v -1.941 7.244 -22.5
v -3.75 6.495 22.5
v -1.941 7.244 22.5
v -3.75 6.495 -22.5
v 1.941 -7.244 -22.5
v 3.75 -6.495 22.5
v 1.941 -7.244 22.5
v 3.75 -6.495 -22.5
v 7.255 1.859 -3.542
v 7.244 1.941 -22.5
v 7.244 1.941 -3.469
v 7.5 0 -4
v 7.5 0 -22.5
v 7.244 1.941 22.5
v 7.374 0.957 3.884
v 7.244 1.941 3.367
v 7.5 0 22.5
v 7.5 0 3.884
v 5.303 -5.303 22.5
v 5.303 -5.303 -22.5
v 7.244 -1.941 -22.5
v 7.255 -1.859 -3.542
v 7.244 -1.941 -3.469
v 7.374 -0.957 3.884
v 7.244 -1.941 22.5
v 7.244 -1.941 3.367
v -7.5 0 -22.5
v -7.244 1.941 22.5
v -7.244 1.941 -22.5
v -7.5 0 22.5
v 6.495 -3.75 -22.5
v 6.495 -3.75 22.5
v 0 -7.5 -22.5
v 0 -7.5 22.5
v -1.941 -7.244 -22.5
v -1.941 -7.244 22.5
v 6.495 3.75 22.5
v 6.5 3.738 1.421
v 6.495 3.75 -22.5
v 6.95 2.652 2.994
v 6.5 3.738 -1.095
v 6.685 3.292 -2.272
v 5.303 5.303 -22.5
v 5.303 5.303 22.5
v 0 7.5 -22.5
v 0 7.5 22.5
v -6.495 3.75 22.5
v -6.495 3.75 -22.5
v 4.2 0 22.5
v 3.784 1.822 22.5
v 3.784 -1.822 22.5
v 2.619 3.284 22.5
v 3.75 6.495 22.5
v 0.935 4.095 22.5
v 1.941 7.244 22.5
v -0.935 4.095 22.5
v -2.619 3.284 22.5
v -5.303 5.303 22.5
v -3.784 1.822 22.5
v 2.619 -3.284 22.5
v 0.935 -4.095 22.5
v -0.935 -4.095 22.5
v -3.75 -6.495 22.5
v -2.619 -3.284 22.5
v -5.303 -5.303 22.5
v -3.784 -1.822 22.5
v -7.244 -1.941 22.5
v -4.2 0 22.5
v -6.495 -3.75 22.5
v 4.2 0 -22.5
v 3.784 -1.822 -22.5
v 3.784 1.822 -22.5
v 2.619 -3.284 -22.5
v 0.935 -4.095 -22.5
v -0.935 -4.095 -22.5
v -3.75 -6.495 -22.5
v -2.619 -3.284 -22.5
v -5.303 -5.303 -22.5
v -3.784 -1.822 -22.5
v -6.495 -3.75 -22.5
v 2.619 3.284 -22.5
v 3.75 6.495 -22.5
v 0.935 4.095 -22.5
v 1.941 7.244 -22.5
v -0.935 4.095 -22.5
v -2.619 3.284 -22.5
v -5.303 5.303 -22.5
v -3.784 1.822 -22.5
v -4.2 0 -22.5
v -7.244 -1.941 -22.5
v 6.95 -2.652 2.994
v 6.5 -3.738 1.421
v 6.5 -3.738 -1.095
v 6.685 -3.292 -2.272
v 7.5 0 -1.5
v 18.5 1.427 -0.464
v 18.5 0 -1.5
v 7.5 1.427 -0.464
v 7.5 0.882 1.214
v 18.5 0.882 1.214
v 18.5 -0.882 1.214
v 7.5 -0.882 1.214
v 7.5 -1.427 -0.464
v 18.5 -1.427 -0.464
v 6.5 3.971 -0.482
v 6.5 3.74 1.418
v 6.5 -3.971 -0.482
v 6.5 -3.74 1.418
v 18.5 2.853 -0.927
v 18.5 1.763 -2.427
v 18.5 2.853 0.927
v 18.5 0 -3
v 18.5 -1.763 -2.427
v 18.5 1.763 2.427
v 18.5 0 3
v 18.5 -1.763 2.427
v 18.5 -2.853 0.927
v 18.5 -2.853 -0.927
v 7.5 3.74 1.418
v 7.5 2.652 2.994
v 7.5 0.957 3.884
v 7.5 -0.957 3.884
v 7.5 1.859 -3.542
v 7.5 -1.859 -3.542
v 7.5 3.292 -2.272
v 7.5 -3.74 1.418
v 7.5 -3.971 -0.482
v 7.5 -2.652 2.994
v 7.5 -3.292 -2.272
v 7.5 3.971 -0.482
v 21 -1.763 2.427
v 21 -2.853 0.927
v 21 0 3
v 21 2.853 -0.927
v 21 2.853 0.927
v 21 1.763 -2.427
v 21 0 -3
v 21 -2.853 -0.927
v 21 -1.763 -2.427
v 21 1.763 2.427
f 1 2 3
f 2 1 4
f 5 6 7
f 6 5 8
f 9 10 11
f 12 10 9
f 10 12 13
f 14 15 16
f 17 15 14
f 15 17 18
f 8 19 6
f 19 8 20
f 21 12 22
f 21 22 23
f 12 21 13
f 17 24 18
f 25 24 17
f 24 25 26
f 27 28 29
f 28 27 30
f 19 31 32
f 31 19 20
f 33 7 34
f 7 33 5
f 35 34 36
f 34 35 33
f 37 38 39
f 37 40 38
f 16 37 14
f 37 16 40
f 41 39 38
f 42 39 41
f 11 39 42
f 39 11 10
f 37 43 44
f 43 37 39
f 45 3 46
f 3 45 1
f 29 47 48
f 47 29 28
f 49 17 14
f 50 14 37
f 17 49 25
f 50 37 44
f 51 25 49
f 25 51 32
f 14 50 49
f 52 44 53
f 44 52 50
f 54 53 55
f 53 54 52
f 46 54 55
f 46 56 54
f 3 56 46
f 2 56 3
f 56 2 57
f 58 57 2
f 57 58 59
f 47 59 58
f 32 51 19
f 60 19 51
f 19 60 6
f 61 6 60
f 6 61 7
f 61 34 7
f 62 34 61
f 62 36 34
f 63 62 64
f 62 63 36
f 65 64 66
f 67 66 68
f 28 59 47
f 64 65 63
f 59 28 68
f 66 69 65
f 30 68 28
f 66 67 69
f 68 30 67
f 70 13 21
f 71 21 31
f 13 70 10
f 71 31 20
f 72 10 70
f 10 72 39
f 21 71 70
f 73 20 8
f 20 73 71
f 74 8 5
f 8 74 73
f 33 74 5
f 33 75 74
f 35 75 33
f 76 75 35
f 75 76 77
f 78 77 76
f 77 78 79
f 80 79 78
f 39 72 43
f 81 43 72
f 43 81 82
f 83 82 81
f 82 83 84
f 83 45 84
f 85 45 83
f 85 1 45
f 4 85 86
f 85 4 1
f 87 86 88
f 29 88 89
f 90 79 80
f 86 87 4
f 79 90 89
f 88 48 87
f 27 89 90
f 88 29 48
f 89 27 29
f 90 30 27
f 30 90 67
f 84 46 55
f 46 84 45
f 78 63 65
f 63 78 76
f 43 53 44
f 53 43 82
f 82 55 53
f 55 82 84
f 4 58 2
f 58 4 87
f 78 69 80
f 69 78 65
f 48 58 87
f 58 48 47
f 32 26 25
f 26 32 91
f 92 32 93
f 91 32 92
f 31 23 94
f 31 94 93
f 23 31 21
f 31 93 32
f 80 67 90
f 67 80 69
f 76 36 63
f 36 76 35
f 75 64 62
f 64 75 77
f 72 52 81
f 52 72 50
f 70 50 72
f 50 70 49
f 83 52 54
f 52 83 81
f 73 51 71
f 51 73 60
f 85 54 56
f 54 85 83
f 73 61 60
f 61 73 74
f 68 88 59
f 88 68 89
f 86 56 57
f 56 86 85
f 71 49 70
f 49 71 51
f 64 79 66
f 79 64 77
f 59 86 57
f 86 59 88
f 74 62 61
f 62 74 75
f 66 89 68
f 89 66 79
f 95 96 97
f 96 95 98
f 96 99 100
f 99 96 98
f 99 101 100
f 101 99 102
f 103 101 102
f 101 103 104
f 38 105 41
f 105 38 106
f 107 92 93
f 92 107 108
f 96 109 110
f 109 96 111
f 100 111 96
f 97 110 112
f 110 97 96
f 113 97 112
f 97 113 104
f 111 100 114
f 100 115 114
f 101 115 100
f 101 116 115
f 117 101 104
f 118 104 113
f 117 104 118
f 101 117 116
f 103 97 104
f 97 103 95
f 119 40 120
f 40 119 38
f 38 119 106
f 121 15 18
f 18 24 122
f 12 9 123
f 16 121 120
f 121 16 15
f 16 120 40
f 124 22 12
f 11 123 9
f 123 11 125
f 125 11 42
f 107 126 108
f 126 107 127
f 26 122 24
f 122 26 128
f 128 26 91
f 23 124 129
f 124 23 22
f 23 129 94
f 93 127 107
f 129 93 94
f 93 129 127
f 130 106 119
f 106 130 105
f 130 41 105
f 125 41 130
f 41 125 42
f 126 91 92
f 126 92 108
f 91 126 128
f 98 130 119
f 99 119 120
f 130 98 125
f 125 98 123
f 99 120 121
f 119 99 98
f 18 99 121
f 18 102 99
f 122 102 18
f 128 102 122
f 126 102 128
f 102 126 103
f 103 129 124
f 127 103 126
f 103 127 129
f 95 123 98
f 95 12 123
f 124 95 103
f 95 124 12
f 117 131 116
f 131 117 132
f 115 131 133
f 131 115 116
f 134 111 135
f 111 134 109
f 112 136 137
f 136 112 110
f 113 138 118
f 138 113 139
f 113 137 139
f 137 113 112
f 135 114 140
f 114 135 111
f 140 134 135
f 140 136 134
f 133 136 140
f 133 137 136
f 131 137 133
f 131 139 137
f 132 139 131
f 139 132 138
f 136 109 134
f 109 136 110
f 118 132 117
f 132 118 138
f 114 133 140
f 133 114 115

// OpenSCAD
// Parameters
bore_diameter_mm = 8.0; //[4.0:16.0:0.1]
outer_diameter_mm = 15.0; //[7.5:30.0:0.1]
length_mm = 45.0; //[22.5:90.0:0.5]
bore_radius_mm = 4.0; //[2.0:8.0:0.1]
outer_radius_mm = 7.5; //[3.75:15.0:0.1]
eps_mm = 0.2; //[0.05:0.5:0.05]
overlap_mm = 1.0; //[0.5:2.0:0.1]
screw_shank_radius_mm = 1.5; //[0.8:3.0:0.1]
screw_length_mm = 12.0; //[6.0:24.0:0.5]
screw_head_radius_mm = 3.0; //[1.5:6.0:0.1]
screw_head_height_mm = 2.5; //[1.0:5.0:0.1]
washer_outer_radius_mm = 4.0; //[2.0:8.0:0.1]
washer_thickness_mm = 1.0; //[0.5:2.5:0.1]

// Linear Bearing - complete geometry
module linear_bearing() {
  color([0.85, 0.85, 0.8]) {
    difference() {
      // Outer casing
      cylinder(r=outer_radius_mm, h=length_mm, center=true);
      // Through bore
      cylinder(r=bore_radius_mm + eps_mm, h=length_mm + 2*eps_mm, center=true);
    }
  }
}

// Screw and Washer - complete geometry
module screw_and_washer() {
  color("DimGray") {
    union() {
      // Screw shank
      translate([outer_radius_mm + screw_length_mm/2 - overlap_mm, 0, 0])
        rotate([0, 90, 0])
        cylinder(r=screw_shank_radius_mm, h=screw_length_mm, center=true);
      // Washer
      translate([outer_radius_mm - overlap_mm + washer_thickness_mm/2, 0, 0])
        rotate([0, 90, 0])
        cylinder(r=washer_outer_radius_mm, h=washer_thickness_mm, center=true);
      // Screw head
      translate([outer_radius_mm + screw_length_mm - overlap_mm + screw_head_height_mm/2, 0, 0])
        rotate([0, 90, 0])
        cylinder(r=screw_head_radius_mm, h=screw_head_height_mm, center=true);
    }
  }
}

// Assembly
module assembly() {
  linear_bearing();
  screw_and_washer();
}

assembly();
